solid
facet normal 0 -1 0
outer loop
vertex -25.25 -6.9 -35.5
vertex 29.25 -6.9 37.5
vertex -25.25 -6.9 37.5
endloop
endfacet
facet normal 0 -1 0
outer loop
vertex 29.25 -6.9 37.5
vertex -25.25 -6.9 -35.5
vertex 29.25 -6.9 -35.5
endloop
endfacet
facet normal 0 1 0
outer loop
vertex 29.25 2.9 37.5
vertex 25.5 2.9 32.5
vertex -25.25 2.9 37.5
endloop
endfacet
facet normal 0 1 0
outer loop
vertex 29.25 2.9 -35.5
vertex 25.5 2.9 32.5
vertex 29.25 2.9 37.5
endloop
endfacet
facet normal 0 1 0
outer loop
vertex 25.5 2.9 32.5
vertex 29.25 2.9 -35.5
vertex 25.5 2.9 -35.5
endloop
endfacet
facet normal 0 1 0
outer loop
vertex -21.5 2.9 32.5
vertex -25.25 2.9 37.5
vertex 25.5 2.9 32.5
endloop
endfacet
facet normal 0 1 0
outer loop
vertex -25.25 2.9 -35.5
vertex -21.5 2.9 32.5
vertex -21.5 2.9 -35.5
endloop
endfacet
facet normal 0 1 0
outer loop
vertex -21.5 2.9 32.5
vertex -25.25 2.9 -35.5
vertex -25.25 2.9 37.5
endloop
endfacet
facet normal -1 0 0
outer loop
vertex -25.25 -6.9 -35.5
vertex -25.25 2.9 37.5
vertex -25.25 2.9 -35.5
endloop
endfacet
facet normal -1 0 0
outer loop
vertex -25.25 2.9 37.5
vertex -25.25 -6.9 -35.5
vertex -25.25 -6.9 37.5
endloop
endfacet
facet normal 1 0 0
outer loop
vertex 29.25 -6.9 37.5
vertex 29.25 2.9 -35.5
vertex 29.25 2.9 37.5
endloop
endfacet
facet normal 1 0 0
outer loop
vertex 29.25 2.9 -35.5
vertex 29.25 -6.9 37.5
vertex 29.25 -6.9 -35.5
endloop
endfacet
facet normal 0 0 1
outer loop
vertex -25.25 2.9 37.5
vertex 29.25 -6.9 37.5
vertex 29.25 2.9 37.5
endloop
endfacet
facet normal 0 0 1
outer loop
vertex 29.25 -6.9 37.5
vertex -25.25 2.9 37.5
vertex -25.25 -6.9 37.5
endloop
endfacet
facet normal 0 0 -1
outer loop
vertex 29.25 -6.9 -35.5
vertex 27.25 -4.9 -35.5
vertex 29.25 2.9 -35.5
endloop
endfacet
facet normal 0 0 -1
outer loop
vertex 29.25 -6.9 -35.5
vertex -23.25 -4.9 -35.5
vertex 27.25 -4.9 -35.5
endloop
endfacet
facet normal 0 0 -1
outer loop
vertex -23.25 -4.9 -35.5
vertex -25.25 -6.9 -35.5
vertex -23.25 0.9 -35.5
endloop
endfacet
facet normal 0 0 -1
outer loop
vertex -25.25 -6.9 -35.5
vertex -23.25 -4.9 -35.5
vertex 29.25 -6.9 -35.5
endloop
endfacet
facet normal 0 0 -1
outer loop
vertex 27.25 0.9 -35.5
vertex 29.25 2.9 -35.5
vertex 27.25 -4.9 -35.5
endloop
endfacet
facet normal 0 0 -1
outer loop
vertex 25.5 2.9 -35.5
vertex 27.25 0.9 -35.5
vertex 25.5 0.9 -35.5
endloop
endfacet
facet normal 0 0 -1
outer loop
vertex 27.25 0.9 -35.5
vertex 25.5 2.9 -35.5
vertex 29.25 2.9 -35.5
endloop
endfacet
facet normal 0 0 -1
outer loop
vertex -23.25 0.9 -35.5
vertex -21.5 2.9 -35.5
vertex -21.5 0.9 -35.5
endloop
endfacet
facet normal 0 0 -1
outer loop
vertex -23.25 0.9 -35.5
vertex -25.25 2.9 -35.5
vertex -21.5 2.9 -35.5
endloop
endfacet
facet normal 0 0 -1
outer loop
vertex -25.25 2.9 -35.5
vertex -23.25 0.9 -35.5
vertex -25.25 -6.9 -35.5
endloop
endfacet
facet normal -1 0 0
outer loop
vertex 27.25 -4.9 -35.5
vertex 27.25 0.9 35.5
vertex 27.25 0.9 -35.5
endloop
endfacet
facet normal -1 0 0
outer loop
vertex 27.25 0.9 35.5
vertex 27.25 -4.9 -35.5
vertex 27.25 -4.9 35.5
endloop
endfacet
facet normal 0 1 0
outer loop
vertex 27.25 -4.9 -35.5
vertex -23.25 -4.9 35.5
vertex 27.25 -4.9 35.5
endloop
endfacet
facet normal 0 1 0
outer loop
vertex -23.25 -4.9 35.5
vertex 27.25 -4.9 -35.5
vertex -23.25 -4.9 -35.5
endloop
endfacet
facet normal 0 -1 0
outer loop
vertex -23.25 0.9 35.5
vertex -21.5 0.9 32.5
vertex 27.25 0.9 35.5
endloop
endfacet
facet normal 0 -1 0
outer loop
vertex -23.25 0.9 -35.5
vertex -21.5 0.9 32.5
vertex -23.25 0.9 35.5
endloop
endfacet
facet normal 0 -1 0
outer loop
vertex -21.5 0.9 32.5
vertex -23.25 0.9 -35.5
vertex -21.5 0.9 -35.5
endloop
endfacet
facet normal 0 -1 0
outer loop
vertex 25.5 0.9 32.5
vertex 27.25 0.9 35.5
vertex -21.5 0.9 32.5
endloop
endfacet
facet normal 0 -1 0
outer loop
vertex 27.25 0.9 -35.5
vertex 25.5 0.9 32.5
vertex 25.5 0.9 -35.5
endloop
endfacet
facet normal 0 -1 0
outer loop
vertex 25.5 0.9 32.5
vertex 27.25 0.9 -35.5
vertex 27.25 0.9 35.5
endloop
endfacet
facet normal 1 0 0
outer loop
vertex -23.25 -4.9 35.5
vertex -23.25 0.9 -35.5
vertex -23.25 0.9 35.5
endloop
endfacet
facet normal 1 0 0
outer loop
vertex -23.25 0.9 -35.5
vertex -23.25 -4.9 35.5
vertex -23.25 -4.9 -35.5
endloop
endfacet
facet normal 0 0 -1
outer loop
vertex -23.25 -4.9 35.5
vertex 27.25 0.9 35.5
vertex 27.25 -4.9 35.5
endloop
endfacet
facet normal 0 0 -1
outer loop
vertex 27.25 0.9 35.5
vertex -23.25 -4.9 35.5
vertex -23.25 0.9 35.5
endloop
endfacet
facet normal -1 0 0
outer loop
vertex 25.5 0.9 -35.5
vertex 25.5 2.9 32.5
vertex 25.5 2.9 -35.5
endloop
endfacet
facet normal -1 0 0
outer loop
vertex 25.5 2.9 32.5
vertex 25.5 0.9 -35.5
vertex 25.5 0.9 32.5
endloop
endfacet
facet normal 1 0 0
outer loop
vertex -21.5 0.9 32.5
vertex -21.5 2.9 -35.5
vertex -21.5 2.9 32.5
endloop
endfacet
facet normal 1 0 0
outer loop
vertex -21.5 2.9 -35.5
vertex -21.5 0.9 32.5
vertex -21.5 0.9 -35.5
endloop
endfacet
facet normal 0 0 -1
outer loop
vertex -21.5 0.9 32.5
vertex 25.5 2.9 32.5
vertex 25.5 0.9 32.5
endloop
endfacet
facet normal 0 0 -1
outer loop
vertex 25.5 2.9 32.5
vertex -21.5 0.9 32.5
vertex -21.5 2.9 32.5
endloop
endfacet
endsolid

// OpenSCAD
module InCarPlate() {
  cube([50,70,5.5],center=true);
}

module InCarPlateCutOut() {
  cube([50.5,71,5.8],center=true);
}

module InCarPlateBackCouOut() {
  cube([47,68,6],center=true);
  
}

module MountPlateBase() {
  minkowski() {
    InCarPlateCutOut();
    cube([4,2,4]);
  }
}

module MountPlate() {
  difference() {
    MountPlateBase();
    translate([2,0,2]) InCarPlateCutOut();
    translate([2,-1.5,-2]) InCarPlateBackCouOut();  
  }
}


rotate([90,0,0]) MountPlate();
